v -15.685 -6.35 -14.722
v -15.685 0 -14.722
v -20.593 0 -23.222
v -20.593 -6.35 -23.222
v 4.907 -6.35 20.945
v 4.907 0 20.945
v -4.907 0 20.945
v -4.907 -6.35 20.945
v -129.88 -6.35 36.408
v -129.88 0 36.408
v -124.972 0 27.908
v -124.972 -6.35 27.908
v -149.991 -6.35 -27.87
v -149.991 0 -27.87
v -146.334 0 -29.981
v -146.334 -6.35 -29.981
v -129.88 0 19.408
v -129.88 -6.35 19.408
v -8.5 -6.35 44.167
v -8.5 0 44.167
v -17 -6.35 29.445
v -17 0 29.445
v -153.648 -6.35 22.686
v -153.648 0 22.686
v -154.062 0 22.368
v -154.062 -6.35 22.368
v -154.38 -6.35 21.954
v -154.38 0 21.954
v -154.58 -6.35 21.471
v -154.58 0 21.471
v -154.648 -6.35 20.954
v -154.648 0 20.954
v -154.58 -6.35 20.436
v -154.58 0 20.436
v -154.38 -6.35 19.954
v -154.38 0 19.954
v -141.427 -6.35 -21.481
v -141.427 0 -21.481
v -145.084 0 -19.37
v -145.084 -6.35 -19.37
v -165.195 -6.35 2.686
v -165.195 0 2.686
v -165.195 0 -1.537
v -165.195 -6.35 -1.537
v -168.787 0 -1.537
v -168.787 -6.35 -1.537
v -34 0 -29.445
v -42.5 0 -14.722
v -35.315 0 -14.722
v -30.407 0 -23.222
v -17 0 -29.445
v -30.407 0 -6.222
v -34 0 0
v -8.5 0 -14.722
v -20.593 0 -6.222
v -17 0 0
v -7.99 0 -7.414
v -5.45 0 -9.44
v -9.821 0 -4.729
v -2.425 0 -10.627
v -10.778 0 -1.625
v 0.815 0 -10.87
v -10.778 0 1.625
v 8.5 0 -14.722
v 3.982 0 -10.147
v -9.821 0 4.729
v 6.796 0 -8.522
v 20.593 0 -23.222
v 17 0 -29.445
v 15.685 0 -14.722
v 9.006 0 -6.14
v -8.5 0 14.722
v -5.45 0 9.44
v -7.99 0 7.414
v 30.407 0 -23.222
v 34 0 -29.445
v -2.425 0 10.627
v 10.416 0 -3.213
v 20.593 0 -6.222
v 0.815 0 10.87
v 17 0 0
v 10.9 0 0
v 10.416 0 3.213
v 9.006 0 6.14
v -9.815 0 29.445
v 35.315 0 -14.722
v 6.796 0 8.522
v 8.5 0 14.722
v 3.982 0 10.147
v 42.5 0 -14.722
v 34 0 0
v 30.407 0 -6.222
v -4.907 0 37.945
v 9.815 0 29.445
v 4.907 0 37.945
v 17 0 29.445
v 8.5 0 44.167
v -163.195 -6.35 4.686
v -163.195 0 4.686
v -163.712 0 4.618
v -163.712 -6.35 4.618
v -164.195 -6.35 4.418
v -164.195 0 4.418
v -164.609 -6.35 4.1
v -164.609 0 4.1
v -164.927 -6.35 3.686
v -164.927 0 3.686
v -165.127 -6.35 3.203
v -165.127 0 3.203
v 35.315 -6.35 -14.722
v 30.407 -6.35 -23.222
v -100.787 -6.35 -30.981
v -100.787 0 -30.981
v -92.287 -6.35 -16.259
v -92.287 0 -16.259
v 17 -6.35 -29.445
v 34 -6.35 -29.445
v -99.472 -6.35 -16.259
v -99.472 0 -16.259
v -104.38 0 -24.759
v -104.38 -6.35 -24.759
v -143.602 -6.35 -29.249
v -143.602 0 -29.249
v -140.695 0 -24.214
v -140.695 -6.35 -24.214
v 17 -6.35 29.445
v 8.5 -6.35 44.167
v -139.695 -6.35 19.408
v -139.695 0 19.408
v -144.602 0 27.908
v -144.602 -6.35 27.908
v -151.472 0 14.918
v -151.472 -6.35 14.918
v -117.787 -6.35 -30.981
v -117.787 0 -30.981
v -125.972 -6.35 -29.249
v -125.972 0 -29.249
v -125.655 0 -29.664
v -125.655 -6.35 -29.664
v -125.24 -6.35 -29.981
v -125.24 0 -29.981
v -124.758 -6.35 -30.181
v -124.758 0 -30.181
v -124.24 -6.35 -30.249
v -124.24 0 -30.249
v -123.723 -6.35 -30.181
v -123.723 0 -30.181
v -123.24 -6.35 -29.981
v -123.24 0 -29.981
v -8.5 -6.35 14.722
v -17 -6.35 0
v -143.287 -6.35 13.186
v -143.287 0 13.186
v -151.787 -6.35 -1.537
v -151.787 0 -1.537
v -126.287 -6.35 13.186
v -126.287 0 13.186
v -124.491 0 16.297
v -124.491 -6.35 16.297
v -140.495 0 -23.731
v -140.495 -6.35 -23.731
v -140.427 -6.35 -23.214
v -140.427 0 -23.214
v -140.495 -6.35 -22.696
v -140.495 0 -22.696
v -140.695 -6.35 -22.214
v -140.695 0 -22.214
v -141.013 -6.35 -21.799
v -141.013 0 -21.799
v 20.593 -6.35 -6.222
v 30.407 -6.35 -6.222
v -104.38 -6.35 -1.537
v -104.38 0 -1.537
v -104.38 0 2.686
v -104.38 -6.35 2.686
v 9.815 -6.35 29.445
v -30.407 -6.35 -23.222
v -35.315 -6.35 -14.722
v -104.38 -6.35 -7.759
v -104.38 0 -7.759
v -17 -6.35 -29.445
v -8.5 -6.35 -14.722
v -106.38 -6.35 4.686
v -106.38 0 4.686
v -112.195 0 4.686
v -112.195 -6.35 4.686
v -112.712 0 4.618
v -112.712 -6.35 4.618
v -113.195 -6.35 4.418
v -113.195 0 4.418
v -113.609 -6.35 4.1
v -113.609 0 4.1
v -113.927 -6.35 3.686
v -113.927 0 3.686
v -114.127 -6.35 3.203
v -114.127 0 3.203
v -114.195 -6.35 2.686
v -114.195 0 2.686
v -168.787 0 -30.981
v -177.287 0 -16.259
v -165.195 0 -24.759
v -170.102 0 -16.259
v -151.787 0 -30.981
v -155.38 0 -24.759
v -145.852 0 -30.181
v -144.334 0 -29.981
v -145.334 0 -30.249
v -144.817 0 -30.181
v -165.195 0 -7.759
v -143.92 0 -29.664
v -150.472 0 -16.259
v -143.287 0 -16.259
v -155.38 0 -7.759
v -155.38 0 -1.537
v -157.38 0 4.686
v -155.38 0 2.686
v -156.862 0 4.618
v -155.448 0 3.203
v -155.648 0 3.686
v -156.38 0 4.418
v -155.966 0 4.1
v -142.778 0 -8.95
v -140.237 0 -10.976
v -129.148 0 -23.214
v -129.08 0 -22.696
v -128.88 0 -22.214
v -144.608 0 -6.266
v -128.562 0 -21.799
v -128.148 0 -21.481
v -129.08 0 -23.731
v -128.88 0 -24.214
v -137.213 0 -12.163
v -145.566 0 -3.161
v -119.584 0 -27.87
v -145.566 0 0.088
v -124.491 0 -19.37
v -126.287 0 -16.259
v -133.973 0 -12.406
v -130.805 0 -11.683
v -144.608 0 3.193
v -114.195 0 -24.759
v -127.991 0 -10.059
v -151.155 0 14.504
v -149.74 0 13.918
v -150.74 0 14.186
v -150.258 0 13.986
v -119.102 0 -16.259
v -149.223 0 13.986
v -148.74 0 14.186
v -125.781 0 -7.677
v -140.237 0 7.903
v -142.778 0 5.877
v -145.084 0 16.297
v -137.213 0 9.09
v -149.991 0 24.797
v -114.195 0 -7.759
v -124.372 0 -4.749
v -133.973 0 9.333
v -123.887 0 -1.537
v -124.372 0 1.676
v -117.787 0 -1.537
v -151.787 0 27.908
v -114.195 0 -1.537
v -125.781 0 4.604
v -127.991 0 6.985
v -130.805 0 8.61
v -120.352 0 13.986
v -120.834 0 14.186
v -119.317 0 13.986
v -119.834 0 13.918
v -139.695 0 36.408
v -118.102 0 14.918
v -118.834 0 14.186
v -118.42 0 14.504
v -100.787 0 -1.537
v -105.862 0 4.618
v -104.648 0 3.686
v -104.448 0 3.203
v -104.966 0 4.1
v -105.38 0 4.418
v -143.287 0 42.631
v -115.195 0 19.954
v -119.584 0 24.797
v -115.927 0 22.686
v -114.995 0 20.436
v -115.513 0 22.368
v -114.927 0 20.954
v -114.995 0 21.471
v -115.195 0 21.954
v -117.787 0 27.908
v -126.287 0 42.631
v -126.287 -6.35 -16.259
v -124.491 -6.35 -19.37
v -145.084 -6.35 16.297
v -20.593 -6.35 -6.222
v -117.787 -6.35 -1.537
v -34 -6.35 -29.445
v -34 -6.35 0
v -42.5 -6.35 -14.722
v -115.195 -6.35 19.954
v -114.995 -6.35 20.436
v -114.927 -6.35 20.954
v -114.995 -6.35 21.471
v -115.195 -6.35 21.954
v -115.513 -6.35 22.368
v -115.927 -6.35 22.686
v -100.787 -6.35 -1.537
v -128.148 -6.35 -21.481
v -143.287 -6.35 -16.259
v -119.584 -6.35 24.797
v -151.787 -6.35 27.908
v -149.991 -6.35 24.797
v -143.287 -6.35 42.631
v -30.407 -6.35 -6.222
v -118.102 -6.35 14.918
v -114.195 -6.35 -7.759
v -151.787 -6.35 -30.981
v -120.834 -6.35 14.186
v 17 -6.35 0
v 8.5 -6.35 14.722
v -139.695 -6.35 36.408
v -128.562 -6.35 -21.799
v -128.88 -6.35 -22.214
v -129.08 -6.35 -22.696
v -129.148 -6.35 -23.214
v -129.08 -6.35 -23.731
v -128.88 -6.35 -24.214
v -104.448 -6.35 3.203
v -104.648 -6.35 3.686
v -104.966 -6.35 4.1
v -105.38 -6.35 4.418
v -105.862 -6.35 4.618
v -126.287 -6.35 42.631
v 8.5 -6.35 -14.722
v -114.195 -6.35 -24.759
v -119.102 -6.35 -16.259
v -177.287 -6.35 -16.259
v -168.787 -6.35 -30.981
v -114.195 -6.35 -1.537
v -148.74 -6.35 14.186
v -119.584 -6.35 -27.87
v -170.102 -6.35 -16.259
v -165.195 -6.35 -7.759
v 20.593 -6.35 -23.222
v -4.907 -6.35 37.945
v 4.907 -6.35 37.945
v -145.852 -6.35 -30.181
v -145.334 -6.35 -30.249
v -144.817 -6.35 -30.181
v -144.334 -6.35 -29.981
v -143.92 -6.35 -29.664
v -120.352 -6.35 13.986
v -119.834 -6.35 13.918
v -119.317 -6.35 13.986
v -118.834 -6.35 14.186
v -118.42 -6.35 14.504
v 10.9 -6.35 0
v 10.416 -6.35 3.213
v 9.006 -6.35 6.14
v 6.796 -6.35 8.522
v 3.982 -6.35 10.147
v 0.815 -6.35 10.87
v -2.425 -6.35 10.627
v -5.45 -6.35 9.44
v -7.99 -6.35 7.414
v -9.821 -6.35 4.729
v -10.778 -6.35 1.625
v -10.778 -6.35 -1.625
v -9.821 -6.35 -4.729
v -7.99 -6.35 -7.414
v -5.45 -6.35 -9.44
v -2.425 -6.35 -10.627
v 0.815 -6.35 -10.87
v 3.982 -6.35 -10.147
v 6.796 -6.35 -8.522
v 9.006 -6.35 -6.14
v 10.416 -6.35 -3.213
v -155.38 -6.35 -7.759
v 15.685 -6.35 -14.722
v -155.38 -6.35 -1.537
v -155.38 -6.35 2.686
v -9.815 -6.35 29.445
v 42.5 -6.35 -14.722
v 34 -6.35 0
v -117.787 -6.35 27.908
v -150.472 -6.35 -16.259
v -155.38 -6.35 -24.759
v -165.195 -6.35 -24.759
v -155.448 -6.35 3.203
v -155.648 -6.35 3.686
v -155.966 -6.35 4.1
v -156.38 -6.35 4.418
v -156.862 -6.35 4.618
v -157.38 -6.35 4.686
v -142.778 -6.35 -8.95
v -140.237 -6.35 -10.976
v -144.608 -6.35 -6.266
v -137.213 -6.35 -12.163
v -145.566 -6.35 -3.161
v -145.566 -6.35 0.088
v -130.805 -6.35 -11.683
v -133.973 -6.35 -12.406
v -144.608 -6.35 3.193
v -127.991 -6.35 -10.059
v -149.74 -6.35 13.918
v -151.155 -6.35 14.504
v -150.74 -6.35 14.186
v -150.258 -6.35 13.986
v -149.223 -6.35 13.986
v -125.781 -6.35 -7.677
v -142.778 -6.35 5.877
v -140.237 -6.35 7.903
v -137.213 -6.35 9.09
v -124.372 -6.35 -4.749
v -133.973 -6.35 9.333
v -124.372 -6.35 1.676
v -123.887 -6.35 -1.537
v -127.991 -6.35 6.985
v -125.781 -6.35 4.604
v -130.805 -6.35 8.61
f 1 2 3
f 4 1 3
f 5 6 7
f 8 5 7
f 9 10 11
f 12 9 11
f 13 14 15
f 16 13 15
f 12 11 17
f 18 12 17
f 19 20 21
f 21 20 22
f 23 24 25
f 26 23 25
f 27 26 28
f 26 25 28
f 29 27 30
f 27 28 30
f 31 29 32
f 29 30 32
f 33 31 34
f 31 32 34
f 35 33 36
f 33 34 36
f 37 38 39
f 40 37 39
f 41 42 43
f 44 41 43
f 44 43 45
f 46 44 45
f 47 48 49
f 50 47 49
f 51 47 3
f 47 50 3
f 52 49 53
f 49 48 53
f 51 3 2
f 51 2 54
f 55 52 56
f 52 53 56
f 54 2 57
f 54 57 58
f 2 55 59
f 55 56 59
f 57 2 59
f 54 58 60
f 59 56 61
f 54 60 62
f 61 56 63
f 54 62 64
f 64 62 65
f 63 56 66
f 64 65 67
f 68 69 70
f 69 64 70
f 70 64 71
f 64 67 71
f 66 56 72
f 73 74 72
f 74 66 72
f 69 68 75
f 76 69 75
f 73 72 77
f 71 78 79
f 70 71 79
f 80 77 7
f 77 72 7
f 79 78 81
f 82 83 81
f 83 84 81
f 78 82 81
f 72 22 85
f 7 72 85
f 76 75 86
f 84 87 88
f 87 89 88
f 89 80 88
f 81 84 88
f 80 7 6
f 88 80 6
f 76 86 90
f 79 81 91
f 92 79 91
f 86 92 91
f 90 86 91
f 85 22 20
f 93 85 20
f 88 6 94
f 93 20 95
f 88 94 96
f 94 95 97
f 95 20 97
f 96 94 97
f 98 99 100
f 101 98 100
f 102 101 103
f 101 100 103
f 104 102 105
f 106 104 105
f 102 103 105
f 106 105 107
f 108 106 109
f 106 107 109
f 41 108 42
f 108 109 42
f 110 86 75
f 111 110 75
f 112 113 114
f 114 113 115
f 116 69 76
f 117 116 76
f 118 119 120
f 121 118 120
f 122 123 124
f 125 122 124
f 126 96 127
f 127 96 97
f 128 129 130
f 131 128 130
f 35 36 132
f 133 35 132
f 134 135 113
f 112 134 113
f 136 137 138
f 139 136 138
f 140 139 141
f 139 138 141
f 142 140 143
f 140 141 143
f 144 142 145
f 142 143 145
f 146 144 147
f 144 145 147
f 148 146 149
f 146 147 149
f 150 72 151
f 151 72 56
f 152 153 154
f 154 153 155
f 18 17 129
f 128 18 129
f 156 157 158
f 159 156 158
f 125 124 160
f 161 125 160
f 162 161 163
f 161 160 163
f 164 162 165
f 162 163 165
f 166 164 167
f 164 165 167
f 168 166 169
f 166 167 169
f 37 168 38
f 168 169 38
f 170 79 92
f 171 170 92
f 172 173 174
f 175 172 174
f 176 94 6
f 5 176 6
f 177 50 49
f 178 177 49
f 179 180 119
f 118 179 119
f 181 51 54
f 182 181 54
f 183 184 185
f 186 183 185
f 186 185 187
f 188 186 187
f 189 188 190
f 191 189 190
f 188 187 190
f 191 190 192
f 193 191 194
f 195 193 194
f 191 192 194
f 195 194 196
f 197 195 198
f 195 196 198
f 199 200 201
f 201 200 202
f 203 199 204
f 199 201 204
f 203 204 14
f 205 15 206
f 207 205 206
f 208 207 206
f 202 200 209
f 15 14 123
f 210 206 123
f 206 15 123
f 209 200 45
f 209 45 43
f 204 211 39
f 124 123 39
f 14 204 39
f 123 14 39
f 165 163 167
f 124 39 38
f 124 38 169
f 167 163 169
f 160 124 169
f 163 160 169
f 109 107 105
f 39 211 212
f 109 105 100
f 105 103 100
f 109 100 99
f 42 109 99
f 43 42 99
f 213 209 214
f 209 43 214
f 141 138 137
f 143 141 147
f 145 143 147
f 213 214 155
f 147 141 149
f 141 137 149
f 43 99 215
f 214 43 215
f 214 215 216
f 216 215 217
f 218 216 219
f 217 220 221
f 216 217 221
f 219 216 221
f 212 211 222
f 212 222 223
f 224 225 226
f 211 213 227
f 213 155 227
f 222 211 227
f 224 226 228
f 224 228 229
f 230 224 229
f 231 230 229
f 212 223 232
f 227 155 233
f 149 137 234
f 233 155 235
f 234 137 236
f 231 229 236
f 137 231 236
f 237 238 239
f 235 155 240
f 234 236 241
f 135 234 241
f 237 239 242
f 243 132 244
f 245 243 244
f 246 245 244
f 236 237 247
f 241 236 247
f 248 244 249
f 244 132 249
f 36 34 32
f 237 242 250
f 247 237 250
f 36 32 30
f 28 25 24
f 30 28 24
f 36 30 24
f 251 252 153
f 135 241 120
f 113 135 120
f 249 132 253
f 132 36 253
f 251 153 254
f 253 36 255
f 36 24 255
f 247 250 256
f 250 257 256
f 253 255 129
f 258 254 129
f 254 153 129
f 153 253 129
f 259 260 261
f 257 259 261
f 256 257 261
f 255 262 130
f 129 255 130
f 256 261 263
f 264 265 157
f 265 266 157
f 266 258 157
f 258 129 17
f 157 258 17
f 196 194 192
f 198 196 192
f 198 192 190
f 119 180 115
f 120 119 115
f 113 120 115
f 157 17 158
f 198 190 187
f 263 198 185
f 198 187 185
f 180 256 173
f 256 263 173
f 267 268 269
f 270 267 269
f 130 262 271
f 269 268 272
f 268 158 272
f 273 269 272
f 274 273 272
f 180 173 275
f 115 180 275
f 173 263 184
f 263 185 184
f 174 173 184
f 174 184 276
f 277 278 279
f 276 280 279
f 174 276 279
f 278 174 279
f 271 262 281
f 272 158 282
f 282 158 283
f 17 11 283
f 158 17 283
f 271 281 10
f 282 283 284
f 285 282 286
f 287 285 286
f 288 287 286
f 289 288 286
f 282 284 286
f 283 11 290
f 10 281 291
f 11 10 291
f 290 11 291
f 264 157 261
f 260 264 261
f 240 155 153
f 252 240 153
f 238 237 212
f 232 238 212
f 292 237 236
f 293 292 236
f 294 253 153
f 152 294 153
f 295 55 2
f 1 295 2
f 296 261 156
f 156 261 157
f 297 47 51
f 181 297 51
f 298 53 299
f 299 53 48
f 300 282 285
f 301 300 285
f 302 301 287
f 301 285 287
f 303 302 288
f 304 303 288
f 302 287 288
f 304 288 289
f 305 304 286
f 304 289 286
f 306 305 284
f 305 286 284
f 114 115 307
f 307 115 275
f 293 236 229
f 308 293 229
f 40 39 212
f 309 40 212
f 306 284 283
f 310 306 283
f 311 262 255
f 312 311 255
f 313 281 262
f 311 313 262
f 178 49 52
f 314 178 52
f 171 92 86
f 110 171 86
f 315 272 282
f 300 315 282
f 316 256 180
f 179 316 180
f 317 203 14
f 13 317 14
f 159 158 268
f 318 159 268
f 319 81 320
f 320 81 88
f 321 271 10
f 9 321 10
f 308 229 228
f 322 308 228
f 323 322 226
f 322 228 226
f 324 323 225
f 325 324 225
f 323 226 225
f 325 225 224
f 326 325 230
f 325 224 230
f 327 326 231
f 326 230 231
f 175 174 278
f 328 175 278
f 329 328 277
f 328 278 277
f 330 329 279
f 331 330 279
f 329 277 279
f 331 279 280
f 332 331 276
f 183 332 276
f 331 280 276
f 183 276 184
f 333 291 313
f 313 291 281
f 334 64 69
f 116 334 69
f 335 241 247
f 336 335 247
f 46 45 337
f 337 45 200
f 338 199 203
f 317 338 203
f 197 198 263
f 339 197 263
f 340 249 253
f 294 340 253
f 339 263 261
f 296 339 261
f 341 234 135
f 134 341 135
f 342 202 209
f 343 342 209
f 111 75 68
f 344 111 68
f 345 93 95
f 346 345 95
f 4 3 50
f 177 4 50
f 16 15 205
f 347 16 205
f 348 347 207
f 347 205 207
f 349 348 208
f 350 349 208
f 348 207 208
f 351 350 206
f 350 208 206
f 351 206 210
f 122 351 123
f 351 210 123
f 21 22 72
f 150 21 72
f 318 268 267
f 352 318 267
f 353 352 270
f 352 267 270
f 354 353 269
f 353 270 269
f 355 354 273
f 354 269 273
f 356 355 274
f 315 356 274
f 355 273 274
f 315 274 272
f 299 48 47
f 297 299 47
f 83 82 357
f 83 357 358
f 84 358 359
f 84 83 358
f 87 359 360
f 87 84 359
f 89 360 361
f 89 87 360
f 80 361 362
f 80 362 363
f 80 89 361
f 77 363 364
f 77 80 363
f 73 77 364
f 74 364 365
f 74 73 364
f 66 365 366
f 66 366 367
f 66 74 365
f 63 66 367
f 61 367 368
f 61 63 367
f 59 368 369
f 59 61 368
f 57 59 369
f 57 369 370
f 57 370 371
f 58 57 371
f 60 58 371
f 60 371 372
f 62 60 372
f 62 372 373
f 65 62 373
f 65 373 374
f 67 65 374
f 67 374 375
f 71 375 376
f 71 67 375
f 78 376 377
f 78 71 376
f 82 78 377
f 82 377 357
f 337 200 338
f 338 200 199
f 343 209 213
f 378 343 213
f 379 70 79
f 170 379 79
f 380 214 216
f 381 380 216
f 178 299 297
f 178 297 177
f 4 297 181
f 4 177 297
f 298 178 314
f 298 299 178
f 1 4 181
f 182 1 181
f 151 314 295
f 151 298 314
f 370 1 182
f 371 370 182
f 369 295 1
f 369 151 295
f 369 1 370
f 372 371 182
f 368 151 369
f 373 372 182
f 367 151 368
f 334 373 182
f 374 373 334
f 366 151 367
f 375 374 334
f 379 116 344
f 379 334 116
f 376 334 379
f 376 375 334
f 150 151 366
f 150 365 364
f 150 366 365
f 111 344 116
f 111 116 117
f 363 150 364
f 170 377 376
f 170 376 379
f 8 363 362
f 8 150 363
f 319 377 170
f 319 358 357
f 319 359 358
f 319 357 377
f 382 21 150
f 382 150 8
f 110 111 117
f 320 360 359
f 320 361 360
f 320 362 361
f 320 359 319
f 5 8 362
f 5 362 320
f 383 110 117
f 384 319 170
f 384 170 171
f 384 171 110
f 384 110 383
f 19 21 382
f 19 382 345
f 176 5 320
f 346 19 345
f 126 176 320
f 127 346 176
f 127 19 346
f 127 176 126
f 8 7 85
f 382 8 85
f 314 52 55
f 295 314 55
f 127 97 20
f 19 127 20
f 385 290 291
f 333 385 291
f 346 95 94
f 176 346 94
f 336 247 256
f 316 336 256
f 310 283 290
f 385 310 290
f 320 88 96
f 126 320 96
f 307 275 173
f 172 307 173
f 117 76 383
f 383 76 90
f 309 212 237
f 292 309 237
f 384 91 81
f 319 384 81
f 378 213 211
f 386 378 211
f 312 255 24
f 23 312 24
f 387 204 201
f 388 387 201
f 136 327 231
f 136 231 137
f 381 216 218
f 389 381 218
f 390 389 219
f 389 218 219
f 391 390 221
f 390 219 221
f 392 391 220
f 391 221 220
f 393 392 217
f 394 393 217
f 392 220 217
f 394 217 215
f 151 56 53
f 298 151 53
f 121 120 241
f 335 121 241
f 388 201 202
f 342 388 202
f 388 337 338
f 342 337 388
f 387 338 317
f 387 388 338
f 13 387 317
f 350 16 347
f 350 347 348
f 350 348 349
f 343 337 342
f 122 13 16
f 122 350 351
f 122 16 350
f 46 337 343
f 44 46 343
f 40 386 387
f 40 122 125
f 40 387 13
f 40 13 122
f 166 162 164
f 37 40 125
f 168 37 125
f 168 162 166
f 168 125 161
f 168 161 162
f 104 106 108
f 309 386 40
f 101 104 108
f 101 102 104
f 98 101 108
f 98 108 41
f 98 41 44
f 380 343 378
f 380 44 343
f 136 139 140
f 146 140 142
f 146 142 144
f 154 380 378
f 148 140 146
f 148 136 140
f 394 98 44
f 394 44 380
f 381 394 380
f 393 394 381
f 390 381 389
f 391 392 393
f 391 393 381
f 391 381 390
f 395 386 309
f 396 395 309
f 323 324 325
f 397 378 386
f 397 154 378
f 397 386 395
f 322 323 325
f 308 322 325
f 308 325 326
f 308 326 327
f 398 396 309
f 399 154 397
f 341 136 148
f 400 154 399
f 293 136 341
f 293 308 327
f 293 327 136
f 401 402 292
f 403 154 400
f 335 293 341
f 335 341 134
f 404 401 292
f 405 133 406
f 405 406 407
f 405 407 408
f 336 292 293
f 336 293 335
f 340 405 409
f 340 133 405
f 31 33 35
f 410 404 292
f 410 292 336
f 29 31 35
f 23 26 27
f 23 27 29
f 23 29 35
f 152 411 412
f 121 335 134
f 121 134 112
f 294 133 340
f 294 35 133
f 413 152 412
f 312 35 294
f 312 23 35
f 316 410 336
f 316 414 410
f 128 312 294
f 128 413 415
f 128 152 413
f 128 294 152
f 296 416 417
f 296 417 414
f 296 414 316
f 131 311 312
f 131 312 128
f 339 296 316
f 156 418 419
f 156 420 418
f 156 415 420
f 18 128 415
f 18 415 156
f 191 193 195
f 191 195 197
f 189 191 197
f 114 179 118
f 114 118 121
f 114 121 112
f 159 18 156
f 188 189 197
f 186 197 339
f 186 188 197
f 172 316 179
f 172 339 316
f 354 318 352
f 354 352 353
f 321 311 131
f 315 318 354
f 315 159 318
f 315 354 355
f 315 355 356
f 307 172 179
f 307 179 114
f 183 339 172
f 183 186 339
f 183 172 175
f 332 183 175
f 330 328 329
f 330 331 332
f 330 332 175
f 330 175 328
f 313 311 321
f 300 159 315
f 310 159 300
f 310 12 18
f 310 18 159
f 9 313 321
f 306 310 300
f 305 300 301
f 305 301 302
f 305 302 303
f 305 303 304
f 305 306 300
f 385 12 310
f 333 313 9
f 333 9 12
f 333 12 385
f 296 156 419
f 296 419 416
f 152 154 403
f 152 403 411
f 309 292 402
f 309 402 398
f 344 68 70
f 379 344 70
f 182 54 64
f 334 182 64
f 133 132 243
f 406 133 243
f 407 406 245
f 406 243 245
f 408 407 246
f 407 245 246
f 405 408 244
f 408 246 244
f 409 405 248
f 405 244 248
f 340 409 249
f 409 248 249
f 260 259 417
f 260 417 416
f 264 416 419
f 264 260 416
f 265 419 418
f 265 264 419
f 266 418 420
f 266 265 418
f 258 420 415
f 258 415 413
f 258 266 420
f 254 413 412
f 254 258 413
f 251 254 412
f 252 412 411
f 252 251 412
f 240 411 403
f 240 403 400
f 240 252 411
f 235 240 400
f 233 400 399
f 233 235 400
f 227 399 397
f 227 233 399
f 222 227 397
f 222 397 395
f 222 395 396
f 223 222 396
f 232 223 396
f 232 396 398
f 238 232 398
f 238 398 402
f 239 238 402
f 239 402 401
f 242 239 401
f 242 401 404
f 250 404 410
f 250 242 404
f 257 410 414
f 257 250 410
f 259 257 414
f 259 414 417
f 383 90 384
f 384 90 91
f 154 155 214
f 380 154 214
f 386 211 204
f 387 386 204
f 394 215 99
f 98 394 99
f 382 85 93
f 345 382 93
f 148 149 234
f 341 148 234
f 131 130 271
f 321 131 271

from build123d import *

# Parameters (mm, degrees)
F0_R     = 10.9
F1_DEPTH = 6.35
F2_DEPTH = 6.35


with BuildPart() as f1:
    # F0 (on Front) → F1 (new body)
    with BuildSketch(Plane.XZ):
        Polygon((17, 0), (8.5, 14.722432), (17, 29.444864), (8.5, 44.167296), (-8.5, 44.167296), (-17, 29.444864), (-8.5, 14.722432), (-17, 0), (-34, 0), (-42.5, -14.722432), (-34, -29.444864), (-17, -29.444864), (-8.5, -14.722432), (8.5, -14.722432), (17, -29.444864), (34, -29.444864), (42.5, -14.722432), (34, 0), align=None)
        Polygon((-15.685045, -14.722432), (-20.592523, -23.222432), (-30.407477, -23.222432), (-35.314955, -14.722432), (-30.407477, -6.222432), (-20.592523, -6.222432), align=None, mode=Mode.SUBTRACT)
        Polygon((15.685045, -14.722432), (20.592523, -6.222432), (30.407477, -6.222432), (35.314955, -14.722432), (30.407477, -23.222432), (20.592523, -23.222432), align=None, mode=Mode.SUBTRACT)
        Circle(F0_R, mode=Mode.SUBTRACT)
        Polygon((4.907477, 20.944864), (-4.907477, 20.944864), (-9.814955, 29.444864), (-4.907477, 37.944864), (4.907477, 37.944864), (9.814955, 29.444864), align=None, mode=Mode.SUBTRACT)
    extrude(amount=F1_DEPTH)

    # F0 (on Front) → F2 (join)
    with BuildSketch(Plane.XZ):
        Polygon((17, 0), (8.5, 14.722432), (17, 29.444864), (8.5, 44.167296), (-8.5, 44.167296), (-17, 29.444864), (-8.5, 14.722432), (-17, 0), (-34, 0), (-42.5, -14.722432), (-34, -29.444864), (-17, -29.444864), (-8.5, -14.722432), (8.5, -14.722432), (17, -29.444864), (34, -29.444864), (42.5, -14.722432), (34, 0), align=None)
        Polygon((-15.685045, -14.722432), (-20.592523, -23.222432), (-30.407477, -23.222432), (-35.314955, -14.722432), (-30.407477, -6.222432), (-20.592523, -6.222432), align=None, mode=Mode.SUBTRACT)
        Polygon((15.685045, -14.722432), (20.592523, -6.222432), (30.407477, -6.222432), (35.314955, -14.722432), (30.407477, -23.222432), (20.592523, -23.222432), align=None, mode=Mode.SUBTRACT)
        Circle(F0_R, mode=Mode.SUBTRACT)
        Polygon((4.907477, 20.944864), (-4.907477, 20.944864), (-9.814955, 29.444864), (-4.907477, 37.944864), (4.907477, 37.944864), (9.814955, 29.444864), align=None, mode=Mode.SUBTRACT)
        with BuildLine():
            Line((-117.787359, -1.536604), (-126.287359, 13.185828))
            Line((-126.287359, 13.185828), (-124.491098, 16.297044))
            Line((-124.491098, 16.297044), (-120.834366, 14.185829))
            ThreePointArc((-120.834366, 14.185829), (-119.316728, 13.986028), (-118.102316, 14.917879))
            Line((-118.102316, 14.917879), (-115.194838, 19.953778))
            ThreePointArc((-115.194838, 19.953778), (-114.995038, 21.471416), (-115.926889, 22.685829))
            Line((-115.926889, 22.685829), (-119.583621, 24.797044))
            Line((-119.583621, 24.797044), (-117.787359, 27.90826))
            Line((-117.787359, 27.90826), (-126.287359, 42.630691))
            Line((-126.287359, 42.630691), (-143.287359, 42.630691))
            Line((-143.287359, 42.630691), (-151.787359, 27.90826))
            Line((-151.787359, 27.90826), (-149.991098, 24.797044))
            Line((-149.991098, 24.797044), (-153.64783, 22.685829))
            ThreePointArc((-153.64783, 22.685829), (-154.579681, 21.471416), (-154.379881, 19.953778))
            Line((-154.379881, 19.953778), (-151.472403, 14.917879))
            ThreePointArc((-151.472403, 14.917879), (-150.257991, 13.986028), (-148.740352, 14.185829))
            Line((-148.740352, 14.185829), (-145.083621, 16.297044))
            Line((-145.083621, 16.297044), (-143.287359, 13.185828))
            Line((-143.287359, 13.185828), (-151.787359, -1.536604))
            Line((-151.787359, -1.536604), (-155.379882, -1.536604))
            Line((-155.379882, -1.536604), (-155.379882, 2.685826))
            ThreePointArc((-155.379882, 2.685826), (-155.965669, 4.100039), (-157.379882, 4.685826))
            Line((-157.379882, 4.685826), (-163.194837, 4.685826))
            ThreePointArc((-163.194837, 4.685826), (-164.60905, 4.100039), (-165.194837, 2.685826))
            Line((-165.194837, 2.685826), (-165.194837, -1.536604))
            Line((-165.194837, -1.536604), (-168.787359, -1.536604))
            Line((-168.787359, -1.536604), (-177.287359, -16.259036))
            Line((-177.287359, -16.259036), (-168.787359, -30.981468))
            Line((-168.787359, -30.981468), (-151.787359, -30.981468))
            Line((-151.787359, -30.981468), (-149.991098, -27.870252))
            Line((-149.991098, -27.870252), (-146.334366, -29.981467))
            ThreePointArc((-146.334366, -29.981467), (-144.816728, -30.181268), (-143.602316, -29.249416))
            Line((-143.602316, -29.249416), (-140.694838, -24.213518))
            ThreePointArc((-140.694838, -24.213518), (-140.495038, -22.69588), (-141.426889, -21.481467))
            Line((-141.426889, -21.481467), (-145.083621, -19.370252))
            Line((-145.083621, -19.370252), (-143.287359, -16.259036))
            Line((-143.287359, -16.259036), (-126.287359, -16.259036))
            Line((-126.287359, -16.259036), (-124.491098, -19.370252))
            Line((-124.491098, -19.370252), (-128.14783, -21.481467))
            ThreePointArc((-128.14783, -21.481467), (-129.079681, -22.69588), (-128.879881, -24.213518))
            Line((-128.879881, -24.213518), (-125.972403, -29.249416))
            ThreePointArc((-125.972403, -29.249416), (-124.757991, -30.181268), (-123.240352, -29.981467))
            Line((-123.240352, -29.981467), (-119.583621, -27.870252))
            Line((-119.583621, -27.870252), (-117.787359, -30.981468))
            Line((-117.787359, -30.981468), (-100.787359, -30.981468))
            Line((-100.787359, -30.981468), (-92.287359, -16.259036))
            Line((-92.287359, -16.259036), (-100.787359, -1.536604))
            Line((-100.787359, -1.536604), (-104.379882, -1.536604))
            Line((-104.379882, -1.536604), (-104.379882, 2.685826))
            ThreePointArc((-104.379882, 2.685826), (-104.965669, 4.100039), (-106.379882, 4.685826))
            Line((-106.379882, 4.685826), (-112.194837, 4.685826))
            ThreePointArc((-112.194837, 4.685826), (-113.60905, 4.100039), (-114.194837, 2.685826))
            Line((-114.194837, 2.685826), (-114.194837, -1.536604))
            Line((-114.194837, -1.536604), (-117.787359, -1.536604))
        make_face()
        Polygon((-150.472405, -16.259036), (-155.379882, -24.759036), (-165.194837, -24.759036), (-170.102314, -16.259036), (-165.194837, -7.759036), (-155.379882, -7.759036), align=None, mode=Mode.SUBTRACT)
        Polygon((-119.102314, -16.259036), (-114.194837, -7.759036), (-104.379882, -7.759036), (-99.472405, -16.259036), (-104.379882, -24.759036), (-114.194837, -24.759036), align=None, mode=Mode.SUBTRACT)
        with Locations((-134.787359, -1.536604)):
            Circle(F0_R, mode=Mode.SUBTRACT)
        Polygon((-129.879882, 19.40826), (-139.694837, 19.40826), (-144.602314, 27.90826), (-139.694837, 36.40826), (-129.879882, 36.40826), (-124.972405, 27.90826), align=None, mode=Mode.SUBTRACT)
    extrude(amount=F2_DEPTH)


solid = f1.part
